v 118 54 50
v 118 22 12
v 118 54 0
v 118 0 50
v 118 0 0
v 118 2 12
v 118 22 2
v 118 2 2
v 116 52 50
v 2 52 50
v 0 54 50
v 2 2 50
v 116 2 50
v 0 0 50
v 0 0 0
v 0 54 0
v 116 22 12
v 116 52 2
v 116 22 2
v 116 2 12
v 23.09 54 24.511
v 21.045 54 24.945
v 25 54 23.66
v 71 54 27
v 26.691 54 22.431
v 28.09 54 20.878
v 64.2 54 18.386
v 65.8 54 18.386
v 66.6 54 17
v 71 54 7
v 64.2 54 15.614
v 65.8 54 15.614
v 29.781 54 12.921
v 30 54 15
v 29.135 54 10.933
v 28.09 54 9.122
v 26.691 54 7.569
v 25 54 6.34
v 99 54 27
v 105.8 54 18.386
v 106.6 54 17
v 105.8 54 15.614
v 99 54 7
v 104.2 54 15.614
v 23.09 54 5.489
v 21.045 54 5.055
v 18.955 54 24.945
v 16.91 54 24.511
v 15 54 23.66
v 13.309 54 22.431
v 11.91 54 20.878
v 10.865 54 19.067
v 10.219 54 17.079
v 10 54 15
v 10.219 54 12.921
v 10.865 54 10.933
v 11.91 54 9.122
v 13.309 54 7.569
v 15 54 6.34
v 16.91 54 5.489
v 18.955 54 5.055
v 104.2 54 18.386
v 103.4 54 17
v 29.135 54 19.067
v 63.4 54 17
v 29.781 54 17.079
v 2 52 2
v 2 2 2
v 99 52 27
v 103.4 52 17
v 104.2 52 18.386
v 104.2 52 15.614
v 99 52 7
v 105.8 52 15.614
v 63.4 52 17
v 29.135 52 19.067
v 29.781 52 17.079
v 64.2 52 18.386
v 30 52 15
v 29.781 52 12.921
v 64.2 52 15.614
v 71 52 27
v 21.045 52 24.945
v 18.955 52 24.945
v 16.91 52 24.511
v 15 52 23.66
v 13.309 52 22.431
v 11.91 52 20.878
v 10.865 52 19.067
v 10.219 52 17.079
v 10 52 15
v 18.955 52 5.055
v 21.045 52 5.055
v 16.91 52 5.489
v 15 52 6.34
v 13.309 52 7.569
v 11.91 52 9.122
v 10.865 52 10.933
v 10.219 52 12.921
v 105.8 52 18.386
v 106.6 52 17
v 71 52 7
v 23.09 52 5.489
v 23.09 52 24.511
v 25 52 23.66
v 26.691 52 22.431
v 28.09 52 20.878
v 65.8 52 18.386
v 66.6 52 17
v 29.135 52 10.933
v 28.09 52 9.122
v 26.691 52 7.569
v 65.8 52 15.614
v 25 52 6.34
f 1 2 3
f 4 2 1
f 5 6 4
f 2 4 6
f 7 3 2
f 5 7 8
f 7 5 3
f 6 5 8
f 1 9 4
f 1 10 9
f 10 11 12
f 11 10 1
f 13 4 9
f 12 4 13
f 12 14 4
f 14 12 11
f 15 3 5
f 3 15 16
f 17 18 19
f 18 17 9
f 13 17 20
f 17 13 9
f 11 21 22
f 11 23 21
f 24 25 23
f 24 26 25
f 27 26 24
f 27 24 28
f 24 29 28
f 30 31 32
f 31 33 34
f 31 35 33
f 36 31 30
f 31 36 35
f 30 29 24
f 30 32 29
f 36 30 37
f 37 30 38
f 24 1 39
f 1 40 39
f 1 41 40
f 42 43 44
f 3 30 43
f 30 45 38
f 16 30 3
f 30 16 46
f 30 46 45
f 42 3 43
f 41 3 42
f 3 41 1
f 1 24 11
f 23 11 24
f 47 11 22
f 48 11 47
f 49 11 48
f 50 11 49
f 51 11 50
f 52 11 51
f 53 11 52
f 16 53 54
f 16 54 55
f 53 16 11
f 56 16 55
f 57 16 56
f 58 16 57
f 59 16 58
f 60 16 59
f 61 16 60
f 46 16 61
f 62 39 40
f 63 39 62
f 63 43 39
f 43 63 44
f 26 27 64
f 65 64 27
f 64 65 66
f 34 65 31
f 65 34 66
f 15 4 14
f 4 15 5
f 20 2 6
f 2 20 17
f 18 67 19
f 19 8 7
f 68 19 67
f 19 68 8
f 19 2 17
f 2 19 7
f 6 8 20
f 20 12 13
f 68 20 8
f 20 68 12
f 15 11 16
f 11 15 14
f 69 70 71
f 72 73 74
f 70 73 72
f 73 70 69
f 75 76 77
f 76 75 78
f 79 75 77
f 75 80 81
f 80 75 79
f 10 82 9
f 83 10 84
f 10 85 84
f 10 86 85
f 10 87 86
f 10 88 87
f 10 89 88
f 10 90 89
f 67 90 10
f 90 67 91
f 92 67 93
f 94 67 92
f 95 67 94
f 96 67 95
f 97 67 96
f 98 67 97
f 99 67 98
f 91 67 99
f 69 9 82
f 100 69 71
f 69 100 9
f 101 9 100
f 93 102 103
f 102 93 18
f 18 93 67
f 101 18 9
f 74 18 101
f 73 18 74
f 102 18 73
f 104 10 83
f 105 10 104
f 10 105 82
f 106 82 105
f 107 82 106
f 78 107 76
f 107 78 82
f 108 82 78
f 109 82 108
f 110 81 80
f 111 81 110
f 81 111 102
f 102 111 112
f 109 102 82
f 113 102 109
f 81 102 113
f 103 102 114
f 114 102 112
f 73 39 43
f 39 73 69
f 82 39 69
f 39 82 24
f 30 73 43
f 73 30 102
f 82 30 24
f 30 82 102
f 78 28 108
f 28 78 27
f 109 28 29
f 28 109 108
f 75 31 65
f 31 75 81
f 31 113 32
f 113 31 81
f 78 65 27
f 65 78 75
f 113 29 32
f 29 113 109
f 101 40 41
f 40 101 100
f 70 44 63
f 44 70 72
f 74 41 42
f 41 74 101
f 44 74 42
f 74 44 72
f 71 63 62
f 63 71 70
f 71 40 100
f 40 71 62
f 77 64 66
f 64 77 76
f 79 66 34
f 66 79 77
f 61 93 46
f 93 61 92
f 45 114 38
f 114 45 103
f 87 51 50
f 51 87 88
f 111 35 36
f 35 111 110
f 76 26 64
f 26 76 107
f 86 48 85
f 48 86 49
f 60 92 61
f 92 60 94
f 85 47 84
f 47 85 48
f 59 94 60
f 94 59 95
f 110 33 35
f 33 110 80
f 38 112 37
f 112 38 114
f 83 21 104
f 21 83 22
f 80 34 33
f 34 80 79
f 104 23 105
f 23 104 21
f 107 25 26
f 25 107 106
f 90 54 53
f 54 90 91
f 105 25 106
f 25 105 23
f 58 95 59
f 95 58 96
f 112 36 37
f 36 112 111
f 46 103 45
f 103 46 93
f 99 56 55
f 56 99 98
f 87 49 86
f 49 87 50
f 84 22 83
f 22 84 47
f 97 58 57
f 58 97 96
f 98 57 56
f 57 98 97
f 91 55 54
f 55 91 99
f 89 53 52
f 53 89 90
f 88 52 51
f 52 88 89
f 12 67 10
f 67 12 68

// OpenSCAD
Case_Width = 114;
Case_Height = 50;
Case_Depth = 50;
Case_thickness = 2;

Connector_Width = 28;
Connector_Height = 20;
Connector_Position = 7;
Connector_Screw_Distance = 5;


Button_Radius = 10; 
Button_Distance = 15;

Wire_Hole_Height = 10;
Wire_Hole_Width = 20;

cube([Case_Width + (Case_thickness * 2),Case_Depth + (Case_thickness * 2), Case_thickness]);
cube([Case_thickness,Case_Depth + (Case_thickness * 2),Case_Height]);
cube([Case_Width + (Case_thickness * 2), Case_thickness, Case_Height]);
difference(){
	translate([Case_Width + Case_thickness, 0,0]) cube([Case_thickness, Case_Depth + (Case_thickness * 2), Case_Height]);
	translate([Case_Width - 3 ,Case_thickness,Case_thickness])	cube([10,Wire_Hole_Width,Wire_Hole_Height]);
}
difference() {
	translate ([0,Case_Depth + Case_thickness,0]) cube([Case_Width + Case_thickness,Case_thickness,Case_Height]);
	
	//Conector
	translate([Case_Width - Connector_Width - 15, Case_Depth - 1 , Connector_Position])     	cube([Connector_Width, (Case_thickness * 2) + 2,Connector_Height]);
	// Parafusos conector
	rotate(90, [1,0,0]) translate([Case_Width - Connector_Width - Button_Distance - 6, Button_Distance + 2 , -Case_Depth - (Case_thickness * 3) - 1])  cylinder(h = (Case_thickness * 4) + 2, r=1.6);
	rotate(90, [1,0,0]) translate([Case_Width - Connector_Width + Button_Distance + 4, Button_Distance + 2, -Case_Depth - (Case_thickness * 3) - 1])  cylinder(h = (Case_thickness * 4) + 2, r=1.6);


	// Botão
	rotate(90, [1,0,0]) translate([20, Button_Distance , -Case_Depth - (Case_thickness * 2) - 1]) cylinder(h = (Case_thickness * 2) + 2, r=Button_Radius);
}
